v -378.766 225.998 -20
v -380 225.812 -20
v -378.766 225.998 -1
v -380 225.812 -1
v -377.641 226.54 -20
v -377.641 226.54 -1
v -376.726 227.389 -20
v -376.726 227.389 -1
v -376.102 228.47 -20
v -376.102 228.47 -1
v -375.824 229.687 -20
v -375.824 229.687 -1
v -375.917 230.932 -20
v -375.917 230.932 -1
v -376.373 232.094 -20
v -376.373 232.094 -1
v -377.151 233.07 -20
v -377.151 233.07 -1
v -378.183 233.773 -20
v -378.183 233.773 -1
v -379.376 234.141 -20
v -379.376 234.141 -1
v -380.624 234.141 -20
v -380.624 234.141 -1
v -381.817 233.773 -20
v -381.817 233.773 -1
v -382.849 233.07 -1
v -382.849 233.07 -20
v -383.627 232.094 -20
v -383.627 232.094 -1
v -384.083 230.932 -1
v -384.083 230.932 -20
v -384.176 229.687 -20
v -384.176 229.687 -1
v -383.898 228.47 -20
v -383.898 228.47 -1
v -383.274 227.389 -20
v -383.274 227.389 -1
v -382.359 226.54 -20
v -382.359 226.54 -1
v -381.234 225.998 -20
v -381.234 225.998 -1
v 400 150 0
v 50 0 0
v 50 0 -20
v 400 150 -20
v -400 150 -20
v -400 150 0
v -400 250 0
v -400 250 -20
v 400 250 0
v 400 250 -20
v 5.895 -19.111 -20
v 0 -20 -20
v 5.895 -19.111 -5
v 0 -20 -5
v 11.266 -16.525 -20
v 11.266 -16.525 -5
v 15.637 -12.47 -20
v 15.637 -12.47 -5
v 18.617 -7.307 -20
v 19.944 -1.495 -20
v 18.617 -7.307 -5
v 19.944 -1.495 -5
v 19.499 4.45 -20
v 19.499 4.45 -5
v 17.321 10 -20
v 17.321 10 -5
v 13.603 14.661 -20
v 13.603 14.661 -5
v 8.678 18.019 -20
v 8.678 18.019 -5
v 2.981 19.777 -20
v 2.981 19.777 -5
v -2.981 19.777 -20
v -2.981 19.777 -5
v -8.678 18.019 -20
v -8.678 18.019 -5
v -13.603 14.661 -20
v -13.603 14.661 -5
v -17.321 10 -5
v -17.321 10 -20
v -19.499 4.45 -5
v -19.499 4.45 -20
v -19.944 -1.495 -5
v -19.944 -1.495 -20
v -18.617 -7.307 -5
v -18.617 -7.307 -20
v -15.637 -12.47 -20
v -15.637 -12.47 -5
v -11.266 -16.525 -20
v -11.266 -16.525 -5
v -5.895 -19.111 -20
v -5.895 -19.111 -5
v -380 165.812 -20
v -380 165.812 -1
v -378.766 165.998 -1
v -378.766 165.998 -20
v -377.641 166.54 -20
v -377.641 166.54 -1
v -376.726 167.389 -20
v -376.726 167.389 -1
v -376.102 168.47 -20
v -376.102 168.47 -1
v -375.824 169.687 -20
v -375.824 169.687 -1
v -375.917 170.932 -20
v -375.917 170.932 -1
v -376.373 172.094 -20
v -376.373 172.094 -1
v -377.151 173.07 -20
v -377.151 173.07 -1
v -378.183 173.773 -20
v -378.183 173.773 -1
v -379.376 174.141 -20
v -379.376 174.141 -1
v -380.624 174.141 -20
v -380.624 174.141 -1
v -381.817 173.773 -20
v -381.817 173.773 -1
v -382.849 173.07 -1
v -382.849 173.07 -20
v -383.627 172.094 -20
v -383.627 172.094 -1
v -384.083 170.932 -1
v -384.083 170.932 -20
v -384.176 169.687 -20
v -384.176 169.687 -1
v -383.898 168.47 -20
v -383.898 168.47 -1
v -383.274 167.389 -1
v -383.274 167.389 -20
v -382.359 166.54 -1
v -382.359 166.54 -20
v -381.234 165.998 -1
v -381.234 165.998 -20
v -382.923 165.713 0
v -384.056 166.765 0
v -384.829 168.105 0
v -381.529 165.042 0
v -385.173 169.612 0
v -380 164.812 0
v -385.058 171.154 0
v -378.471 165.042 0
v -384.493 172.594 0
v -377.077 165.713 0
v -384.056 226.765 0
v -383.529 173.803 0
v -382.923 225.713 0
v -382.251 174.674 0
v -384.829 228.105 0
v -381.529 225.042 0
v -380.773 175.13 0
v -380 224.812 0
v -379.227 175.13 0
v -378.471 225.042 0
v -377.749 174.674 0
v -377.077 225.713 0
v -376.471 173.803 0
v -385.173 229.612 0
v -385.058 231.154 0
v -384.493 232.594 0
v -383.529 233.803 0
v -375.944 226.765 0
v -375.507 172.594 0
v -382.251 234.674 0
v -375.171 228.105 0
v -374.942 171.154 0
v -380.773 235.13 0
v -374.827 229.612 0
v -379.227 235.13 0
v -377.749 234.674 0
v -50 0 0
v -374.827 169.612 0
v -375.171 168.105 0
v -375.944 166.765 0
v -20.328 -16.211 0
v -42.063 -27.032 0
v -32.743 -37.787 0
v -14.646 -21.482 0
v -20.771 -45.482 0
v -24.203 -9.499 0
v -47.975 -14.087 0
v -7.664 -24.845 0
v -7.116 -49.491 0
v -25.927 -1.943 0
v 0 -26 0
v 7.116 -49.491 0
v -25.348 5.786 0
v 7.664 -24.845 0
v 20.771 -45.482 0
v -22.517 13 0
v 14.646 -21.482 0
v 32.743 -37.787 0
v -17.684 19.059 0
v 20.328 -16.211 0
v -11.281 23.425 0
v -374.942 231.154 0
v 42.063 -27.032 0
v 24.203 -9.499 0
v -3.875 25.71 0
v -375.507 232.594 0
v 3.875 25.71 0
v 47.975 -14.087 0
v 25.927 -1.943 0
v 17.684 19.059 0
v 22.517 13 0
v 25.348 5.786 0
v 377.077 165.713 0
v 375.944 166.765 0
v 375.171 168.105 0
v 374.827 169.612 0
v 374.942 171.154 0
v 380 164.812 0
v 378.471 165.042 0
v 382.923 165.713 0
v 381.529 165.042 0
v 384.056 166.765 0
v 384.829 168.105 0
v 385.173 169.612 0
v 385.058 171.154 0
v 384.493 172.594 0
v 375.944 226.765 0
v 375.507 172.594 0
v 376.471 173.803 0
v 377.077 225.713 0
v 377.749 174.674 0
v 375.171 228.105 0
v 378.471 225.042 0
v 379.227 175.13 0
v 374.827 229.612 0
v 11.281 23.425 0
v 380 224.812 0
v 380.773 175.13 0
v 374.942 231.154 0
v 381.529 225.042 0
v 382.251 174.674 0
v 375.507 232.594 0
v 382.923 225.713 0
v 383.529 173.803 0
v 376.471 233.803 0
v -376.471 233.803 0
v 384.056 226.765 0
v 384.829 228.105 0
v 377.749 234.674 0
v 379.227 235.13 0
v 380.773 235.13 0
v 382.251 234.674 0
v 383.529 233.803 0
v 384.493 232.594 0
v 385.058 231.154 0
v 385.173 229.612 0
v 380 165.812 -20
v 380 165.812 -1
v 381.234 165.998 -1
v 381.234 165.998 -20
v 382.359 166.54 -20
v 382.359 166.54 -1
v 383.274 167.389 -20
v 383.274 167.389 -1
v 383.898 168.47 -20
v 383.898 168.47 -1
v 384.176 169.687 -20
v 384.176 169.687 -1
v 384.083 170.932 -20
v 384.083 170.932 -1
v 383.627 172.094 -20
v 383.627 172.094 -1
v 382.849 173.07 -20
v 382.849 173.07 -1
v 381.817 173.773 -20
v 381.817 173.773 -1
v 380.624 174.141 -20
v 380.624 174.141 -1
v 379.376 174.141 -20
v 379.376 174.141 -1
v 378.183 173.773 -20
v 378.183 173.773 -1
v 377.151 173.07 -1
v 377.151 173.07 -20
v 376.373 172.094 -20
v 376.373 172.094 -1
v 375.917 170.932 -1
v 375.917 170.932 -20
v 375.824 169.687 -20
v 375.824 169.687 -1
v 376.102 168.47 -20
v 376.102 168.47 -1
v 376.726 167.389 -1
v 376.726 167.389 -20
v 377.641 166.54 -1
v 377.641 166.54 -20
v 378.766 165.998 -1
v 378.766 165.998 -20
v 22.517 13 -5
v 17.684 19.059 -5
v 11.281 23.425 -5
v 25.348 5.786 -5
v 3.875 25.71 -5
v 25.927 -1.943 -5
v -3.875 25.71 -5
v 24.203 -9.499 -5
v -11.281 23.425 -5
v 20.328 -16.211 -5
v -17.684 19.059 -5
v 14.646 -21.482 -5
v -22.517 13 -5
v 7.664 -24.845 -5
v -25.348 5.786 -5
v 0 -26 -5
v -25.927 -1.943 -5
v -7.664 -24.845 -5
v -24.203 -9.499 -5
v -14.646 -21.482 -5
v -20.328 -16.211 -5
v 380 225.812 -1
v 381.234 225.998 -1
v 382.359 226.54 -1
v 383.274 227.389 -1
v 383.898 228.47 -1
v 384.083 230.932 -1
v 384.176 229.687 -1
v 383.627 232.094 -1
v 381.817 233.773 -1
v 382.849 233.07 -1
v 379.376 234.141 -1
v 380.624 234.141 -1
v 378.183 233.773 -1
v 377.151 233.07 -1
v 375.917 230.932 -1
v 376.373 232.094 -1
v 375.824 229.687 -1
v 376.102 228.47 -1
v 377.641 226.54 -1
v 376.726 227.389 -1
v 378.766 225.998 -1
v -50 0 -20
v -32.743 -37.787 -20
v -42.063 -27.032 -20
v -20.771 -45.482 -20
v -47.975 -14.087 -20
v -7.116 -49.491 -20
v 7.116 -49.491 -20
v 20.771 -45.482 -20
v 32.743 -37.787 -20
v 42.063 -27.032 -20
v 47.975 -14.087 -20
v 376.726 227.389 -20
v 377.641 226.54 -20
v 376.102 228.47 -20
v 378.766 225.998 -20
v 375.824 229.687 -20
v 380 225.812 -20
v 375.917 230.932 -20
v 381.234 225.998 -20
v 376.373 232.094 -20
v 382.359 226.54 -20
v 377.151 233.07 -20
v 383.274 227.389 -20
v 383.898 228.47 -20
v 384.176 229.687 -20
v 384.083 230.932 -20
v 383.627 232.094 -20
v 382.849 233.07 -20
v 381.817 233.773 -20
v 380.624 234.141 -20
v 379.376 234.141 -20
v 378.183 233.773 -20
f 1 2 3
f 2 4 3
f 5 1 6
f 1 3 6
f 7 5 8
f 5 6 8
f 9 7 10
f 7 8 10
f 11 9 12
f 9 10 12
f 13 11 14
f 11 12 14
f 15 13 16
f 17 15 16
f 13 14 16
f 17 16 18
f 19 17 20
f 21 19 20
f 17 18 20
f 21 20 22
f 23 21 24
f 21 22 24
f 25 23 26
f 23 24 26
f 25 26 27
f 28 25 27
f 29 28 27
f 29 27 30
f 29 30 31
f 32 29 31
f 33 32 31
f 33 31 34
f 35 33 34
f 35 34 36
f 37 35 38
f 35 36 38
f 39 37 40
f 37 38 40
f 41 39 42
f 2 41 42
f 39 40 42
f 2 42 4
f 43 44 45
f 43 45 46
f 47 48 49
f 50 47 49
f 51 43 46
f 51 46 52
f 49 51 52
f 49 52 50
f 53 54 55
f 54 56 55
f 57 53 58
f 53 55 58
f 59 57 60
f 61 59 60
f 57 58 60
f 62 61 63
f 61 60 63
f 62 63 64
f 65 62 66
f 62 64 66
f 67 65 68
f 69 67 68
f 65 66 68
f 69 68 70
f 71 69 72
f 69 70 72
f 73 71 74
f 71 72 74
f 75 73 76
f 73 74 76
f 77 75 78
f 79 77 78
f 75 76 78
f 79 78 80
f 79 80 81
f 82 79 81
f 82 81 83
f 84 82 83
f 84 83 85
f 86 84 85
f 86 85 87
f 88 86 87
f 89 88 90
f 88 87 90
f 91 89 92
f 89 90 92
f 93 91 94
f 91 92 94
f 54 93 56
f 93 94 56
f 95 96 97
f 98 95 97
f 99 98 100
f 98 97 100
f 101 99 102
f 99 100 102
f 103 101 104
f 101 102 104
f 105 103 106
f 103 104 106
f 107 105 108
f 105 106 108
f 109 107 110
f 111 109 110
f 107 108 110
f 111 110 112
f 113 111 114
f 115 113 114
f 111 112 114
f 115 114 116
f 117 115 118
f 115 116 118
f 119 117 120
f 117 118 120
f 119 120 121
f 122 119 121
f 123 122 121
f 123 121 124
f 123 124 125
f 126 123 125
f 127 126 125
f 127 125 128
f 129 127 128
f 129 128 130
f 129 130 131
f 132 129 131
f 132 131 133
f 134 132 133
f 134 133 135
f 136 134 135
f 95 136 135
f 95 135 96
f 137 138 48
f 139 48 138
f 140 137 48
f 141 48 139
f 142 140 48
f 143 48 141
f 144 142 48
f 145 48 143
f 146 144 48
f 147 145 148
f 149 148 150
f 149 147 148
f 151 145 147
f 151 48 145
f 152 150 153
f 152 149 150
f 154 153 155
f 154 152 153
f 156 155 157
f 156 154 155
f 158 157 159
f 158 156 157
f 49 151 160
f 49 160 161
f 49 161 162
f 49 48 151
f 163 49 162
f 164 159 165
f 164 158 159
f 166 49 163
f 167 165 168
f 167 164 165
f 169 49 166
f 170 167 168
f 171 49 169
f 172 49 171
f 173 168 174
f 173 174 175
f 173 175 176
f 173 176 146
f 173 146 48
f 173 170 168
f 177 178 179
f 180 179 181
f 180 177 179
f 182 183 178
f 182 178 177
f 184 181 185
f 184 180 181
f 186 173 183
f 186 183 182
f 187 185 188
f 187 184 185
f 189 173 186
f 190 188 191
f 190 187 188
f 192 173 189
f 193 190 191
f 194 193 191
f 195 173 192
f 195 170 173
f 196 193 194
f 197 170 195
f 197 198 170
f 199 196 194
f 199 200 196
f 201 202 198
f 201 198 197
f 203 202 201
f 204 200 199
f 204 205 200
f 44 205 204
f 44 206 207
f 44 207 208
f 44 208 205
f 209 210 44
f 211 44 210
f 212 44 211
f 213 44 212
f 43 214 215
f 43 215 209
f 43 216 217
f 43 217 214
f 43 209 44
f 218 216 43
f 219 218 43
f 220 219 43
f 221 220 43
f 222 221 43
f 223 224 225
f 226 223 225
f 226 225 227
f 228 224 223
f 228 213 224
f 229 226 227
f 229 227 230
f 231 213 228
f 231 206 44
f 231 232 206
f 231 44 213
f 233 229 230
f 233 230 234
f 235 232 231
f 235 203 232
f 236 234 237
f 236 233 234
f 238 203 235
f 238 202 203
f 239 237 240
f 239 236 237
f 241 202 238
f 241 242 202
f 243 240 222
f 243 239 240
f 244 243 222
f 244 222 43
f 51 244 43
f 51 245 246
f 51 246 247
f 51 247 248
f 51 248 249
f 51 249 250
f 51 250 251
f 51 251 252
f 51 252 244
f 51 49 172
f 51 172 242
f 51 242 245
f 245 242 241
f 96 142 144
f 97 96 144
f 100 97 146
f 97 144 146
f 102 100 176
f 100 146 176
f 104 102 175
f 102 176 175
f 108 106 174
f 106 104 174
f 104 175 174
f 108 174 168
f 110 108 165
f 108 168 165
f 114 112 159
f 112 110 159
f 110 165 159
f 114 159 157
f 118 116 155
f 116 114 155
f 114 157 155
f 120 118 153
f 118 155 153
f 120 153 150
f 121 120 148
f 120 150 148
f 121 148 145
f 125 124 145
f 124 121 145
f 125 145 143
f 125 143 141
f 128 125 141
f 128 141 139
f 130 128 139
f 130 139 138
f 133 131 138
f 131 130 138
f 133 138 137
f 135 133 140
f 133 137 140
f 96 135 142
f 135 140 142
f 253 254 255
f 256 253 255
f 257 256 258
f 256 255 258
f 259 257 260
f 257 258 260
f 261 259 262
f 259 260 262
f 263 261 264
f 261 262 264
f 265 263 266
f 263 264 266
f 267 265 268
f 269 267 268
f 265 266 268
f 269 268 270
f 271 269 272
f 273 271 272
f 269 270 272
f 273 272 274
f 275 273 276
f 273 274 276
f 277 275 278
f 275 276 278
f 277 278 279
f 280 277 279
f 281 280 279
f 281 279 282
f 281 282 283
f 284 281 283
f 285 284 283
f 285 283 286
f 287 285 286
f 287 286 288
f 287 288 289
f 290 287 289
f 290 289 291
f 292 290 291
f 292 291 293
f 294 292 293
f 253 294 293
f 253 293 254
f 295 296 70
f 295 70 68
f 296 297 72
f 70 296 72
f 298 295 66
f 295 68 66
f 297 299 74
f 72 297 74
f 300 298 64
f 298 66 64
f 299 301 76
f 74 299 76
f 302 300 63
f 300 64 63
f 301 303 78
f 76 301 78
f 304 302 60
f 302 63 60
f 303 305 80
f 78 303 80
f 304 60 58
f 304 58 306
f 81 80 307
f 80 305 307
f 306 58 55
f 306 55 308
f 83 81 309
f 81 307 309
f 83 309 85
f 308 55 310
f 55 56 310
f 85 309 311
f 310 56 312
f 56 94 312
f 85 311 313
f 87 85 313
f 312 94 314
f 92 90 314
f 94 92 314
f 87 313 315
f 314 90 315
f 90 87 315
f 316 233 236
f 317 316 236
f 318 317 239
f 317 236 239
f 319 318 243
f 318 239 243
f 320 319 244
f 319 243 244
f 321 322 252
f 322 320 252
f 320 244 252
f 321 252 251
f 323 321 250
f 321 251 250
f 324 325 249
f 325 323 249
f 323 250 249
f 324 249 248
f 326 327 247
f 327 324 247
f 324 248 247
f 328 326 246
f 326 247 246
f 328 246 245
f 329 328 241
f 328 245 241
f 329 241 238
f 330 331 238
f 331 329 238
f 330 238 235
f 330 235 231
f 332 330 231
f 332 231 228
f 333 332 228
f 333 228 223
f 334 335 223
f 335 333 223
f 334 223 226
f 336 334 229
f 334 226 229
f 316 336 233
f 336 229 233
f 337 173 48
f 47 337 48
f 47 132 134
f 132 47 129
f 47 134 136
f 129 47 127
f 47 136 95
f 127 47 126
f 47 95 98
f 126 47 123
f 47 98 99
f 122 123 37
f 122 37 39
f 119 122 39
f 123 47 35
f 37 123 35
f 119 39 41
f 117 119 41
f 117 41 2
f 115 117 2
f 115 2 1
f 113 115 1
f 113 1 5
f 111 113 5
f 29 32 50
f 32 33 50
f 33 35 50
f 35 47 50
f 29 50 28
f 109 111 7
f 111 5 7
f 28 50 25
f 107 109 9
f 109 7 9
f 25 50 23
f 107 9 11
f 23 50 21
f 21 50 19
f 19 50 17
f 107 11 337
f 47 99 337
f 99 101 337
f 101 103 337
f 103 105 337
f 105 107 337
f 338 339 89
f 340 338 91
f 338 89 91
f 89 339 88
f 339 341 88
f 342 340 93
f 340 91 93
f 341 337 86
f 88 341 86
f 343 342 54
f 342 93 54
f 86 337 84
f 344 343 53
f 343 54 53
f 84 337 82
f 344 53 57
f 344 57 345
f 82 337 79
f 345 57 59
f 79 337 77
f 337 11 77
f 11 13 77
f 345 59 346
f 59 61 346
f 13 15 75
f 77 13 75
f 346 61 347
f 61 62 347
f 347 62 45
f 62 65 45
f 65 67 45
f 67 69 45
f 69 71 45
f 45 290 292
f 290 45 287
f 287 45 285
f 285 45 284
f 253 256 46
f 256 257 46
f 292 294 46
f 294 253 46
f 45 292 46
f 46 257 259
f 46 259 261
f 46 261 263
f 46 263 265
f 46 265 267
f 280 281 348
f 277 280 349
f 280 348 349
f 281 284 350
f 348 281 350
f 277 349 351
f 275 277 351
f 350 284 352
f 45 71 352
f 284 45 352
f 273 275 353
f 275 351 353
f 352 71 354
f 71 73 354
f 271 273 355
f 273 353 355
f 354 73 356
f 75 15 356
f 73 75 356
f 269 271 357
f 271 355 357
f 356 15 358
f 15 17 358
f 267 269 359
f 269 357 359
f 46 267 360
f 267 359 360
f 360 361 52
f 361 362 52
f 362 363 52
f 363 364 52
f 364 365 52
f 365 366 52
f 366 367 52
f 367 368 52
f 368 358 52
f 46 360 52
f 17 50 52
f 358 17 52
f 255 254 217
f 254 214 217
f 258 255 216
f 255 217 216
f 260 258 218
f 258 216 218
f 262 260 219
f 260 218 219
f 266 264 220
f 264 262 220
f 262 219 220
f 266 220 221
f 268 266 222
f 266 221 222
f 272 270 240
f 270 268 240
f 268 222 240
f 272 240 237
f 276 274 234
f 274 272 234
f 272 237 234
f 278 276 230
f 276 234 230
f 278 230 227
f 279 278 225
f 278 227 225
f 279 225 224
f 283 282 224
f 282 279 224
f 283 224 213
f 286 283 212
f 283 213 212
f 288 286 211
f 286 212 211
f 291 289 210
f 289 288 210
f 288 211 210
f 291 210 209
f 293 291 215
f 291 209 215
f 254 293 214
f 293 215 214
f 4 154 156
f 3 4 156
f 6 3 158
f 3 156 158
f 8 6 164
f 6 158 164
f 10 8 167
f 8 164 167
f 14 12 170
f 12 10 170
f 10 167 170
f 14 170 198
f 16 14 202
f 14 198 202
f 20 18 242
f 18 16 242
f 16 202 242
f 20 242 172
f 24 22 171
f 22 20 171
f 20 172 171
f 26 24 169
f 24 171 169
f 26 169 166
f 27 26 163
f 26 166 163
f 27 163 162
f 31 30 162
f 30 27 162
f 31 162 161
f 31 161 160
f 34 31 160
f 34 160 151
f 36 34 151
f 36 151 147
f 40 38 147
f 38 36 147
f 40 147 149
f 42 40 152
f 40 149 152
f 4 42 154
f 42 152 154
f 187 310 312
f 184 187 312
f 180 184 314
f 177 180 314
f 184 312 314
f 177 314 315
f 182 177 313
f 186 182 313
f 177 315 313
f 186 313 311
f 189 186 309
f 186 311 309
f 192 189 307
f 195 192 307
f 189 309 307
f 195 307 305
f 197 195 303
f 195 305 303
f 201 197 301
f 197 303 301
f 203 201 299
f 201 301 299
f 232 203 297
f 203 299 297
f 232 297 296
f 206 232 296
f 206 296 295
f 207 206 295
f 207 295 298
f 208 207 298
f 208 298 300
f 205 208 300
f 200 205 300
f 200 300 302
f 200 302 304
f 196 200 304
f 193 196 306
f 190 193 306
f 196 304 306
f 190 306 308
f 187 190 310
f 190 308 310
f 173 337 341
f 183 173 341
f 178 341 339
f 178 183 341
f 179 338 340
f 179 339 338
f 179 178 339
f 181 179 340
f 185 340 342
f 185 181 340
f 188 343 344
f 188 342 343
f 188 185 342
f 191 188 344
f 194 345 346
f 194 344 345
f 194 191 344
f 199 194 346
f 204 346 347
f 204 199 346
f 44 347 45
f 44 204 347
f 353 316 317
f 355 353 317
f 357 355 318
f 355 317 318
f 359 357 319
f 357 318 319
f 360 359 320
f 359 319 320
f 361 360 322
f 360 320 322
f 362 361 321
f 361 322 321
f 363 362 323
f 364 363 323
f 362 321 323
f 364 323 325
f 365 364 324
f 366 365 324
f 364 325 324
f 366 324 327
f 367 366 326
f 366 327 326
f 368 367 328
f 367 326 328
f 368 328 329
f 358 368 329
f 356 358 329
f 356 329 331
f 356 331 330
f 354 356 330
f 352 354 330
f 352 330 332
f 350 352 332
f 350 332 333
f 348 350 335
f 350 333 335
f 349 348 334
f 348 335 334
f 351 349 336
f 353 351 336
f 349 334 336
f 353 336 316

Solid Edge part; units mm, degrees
sketch "Sketch1" plane through (0, 0, 0) normal (0, 0, 1) x (1, 0, 0)
  line L0 (400, 250) -> (-400, 250)
  line L1 (-400, 150) -> (-400, 250)
  line L2 (-50, 0) -> (-400, 150)
  arc A0 (50, 0) -> (-50, 0) centre (0, 0) cw
  line L3 (50, 0) -> (400, 150)
  line L4 (400, 150) -> (400, 250)
extrude "Protrusion1" add sketch "Sketch1" against normal blind 20
hole "Bohrung_1" at (0, 0, 0) direction (0, 0, -1) diameter 40 end up to next
hole "Bohrung_2" at (0, 0, 0) direction (0, 0, -1) diameter 52 depth 5
hole "Bohrung_3" at (-380, 230, 0) direction (0, 0, -1) diameter 8.376 end up to next start chamfer 1 start chamfer angle 45
hole "Hole1" at (-380, 170, 0) direction (0, 0, -1) diameter 8.376 end up to next start chamfer 1 start chamfer angle 45
hole "Hole2" at (380, 170, 0) direction (0, 0, -1) diameter 8.376 end up to next start chamfer 1 start chamfer angle 45
hole "Hole3" at (380, 230, 0) direction (0, 0, -1) diameter 8.376 end up to next start chamfer 1 start chamfer angle 45
